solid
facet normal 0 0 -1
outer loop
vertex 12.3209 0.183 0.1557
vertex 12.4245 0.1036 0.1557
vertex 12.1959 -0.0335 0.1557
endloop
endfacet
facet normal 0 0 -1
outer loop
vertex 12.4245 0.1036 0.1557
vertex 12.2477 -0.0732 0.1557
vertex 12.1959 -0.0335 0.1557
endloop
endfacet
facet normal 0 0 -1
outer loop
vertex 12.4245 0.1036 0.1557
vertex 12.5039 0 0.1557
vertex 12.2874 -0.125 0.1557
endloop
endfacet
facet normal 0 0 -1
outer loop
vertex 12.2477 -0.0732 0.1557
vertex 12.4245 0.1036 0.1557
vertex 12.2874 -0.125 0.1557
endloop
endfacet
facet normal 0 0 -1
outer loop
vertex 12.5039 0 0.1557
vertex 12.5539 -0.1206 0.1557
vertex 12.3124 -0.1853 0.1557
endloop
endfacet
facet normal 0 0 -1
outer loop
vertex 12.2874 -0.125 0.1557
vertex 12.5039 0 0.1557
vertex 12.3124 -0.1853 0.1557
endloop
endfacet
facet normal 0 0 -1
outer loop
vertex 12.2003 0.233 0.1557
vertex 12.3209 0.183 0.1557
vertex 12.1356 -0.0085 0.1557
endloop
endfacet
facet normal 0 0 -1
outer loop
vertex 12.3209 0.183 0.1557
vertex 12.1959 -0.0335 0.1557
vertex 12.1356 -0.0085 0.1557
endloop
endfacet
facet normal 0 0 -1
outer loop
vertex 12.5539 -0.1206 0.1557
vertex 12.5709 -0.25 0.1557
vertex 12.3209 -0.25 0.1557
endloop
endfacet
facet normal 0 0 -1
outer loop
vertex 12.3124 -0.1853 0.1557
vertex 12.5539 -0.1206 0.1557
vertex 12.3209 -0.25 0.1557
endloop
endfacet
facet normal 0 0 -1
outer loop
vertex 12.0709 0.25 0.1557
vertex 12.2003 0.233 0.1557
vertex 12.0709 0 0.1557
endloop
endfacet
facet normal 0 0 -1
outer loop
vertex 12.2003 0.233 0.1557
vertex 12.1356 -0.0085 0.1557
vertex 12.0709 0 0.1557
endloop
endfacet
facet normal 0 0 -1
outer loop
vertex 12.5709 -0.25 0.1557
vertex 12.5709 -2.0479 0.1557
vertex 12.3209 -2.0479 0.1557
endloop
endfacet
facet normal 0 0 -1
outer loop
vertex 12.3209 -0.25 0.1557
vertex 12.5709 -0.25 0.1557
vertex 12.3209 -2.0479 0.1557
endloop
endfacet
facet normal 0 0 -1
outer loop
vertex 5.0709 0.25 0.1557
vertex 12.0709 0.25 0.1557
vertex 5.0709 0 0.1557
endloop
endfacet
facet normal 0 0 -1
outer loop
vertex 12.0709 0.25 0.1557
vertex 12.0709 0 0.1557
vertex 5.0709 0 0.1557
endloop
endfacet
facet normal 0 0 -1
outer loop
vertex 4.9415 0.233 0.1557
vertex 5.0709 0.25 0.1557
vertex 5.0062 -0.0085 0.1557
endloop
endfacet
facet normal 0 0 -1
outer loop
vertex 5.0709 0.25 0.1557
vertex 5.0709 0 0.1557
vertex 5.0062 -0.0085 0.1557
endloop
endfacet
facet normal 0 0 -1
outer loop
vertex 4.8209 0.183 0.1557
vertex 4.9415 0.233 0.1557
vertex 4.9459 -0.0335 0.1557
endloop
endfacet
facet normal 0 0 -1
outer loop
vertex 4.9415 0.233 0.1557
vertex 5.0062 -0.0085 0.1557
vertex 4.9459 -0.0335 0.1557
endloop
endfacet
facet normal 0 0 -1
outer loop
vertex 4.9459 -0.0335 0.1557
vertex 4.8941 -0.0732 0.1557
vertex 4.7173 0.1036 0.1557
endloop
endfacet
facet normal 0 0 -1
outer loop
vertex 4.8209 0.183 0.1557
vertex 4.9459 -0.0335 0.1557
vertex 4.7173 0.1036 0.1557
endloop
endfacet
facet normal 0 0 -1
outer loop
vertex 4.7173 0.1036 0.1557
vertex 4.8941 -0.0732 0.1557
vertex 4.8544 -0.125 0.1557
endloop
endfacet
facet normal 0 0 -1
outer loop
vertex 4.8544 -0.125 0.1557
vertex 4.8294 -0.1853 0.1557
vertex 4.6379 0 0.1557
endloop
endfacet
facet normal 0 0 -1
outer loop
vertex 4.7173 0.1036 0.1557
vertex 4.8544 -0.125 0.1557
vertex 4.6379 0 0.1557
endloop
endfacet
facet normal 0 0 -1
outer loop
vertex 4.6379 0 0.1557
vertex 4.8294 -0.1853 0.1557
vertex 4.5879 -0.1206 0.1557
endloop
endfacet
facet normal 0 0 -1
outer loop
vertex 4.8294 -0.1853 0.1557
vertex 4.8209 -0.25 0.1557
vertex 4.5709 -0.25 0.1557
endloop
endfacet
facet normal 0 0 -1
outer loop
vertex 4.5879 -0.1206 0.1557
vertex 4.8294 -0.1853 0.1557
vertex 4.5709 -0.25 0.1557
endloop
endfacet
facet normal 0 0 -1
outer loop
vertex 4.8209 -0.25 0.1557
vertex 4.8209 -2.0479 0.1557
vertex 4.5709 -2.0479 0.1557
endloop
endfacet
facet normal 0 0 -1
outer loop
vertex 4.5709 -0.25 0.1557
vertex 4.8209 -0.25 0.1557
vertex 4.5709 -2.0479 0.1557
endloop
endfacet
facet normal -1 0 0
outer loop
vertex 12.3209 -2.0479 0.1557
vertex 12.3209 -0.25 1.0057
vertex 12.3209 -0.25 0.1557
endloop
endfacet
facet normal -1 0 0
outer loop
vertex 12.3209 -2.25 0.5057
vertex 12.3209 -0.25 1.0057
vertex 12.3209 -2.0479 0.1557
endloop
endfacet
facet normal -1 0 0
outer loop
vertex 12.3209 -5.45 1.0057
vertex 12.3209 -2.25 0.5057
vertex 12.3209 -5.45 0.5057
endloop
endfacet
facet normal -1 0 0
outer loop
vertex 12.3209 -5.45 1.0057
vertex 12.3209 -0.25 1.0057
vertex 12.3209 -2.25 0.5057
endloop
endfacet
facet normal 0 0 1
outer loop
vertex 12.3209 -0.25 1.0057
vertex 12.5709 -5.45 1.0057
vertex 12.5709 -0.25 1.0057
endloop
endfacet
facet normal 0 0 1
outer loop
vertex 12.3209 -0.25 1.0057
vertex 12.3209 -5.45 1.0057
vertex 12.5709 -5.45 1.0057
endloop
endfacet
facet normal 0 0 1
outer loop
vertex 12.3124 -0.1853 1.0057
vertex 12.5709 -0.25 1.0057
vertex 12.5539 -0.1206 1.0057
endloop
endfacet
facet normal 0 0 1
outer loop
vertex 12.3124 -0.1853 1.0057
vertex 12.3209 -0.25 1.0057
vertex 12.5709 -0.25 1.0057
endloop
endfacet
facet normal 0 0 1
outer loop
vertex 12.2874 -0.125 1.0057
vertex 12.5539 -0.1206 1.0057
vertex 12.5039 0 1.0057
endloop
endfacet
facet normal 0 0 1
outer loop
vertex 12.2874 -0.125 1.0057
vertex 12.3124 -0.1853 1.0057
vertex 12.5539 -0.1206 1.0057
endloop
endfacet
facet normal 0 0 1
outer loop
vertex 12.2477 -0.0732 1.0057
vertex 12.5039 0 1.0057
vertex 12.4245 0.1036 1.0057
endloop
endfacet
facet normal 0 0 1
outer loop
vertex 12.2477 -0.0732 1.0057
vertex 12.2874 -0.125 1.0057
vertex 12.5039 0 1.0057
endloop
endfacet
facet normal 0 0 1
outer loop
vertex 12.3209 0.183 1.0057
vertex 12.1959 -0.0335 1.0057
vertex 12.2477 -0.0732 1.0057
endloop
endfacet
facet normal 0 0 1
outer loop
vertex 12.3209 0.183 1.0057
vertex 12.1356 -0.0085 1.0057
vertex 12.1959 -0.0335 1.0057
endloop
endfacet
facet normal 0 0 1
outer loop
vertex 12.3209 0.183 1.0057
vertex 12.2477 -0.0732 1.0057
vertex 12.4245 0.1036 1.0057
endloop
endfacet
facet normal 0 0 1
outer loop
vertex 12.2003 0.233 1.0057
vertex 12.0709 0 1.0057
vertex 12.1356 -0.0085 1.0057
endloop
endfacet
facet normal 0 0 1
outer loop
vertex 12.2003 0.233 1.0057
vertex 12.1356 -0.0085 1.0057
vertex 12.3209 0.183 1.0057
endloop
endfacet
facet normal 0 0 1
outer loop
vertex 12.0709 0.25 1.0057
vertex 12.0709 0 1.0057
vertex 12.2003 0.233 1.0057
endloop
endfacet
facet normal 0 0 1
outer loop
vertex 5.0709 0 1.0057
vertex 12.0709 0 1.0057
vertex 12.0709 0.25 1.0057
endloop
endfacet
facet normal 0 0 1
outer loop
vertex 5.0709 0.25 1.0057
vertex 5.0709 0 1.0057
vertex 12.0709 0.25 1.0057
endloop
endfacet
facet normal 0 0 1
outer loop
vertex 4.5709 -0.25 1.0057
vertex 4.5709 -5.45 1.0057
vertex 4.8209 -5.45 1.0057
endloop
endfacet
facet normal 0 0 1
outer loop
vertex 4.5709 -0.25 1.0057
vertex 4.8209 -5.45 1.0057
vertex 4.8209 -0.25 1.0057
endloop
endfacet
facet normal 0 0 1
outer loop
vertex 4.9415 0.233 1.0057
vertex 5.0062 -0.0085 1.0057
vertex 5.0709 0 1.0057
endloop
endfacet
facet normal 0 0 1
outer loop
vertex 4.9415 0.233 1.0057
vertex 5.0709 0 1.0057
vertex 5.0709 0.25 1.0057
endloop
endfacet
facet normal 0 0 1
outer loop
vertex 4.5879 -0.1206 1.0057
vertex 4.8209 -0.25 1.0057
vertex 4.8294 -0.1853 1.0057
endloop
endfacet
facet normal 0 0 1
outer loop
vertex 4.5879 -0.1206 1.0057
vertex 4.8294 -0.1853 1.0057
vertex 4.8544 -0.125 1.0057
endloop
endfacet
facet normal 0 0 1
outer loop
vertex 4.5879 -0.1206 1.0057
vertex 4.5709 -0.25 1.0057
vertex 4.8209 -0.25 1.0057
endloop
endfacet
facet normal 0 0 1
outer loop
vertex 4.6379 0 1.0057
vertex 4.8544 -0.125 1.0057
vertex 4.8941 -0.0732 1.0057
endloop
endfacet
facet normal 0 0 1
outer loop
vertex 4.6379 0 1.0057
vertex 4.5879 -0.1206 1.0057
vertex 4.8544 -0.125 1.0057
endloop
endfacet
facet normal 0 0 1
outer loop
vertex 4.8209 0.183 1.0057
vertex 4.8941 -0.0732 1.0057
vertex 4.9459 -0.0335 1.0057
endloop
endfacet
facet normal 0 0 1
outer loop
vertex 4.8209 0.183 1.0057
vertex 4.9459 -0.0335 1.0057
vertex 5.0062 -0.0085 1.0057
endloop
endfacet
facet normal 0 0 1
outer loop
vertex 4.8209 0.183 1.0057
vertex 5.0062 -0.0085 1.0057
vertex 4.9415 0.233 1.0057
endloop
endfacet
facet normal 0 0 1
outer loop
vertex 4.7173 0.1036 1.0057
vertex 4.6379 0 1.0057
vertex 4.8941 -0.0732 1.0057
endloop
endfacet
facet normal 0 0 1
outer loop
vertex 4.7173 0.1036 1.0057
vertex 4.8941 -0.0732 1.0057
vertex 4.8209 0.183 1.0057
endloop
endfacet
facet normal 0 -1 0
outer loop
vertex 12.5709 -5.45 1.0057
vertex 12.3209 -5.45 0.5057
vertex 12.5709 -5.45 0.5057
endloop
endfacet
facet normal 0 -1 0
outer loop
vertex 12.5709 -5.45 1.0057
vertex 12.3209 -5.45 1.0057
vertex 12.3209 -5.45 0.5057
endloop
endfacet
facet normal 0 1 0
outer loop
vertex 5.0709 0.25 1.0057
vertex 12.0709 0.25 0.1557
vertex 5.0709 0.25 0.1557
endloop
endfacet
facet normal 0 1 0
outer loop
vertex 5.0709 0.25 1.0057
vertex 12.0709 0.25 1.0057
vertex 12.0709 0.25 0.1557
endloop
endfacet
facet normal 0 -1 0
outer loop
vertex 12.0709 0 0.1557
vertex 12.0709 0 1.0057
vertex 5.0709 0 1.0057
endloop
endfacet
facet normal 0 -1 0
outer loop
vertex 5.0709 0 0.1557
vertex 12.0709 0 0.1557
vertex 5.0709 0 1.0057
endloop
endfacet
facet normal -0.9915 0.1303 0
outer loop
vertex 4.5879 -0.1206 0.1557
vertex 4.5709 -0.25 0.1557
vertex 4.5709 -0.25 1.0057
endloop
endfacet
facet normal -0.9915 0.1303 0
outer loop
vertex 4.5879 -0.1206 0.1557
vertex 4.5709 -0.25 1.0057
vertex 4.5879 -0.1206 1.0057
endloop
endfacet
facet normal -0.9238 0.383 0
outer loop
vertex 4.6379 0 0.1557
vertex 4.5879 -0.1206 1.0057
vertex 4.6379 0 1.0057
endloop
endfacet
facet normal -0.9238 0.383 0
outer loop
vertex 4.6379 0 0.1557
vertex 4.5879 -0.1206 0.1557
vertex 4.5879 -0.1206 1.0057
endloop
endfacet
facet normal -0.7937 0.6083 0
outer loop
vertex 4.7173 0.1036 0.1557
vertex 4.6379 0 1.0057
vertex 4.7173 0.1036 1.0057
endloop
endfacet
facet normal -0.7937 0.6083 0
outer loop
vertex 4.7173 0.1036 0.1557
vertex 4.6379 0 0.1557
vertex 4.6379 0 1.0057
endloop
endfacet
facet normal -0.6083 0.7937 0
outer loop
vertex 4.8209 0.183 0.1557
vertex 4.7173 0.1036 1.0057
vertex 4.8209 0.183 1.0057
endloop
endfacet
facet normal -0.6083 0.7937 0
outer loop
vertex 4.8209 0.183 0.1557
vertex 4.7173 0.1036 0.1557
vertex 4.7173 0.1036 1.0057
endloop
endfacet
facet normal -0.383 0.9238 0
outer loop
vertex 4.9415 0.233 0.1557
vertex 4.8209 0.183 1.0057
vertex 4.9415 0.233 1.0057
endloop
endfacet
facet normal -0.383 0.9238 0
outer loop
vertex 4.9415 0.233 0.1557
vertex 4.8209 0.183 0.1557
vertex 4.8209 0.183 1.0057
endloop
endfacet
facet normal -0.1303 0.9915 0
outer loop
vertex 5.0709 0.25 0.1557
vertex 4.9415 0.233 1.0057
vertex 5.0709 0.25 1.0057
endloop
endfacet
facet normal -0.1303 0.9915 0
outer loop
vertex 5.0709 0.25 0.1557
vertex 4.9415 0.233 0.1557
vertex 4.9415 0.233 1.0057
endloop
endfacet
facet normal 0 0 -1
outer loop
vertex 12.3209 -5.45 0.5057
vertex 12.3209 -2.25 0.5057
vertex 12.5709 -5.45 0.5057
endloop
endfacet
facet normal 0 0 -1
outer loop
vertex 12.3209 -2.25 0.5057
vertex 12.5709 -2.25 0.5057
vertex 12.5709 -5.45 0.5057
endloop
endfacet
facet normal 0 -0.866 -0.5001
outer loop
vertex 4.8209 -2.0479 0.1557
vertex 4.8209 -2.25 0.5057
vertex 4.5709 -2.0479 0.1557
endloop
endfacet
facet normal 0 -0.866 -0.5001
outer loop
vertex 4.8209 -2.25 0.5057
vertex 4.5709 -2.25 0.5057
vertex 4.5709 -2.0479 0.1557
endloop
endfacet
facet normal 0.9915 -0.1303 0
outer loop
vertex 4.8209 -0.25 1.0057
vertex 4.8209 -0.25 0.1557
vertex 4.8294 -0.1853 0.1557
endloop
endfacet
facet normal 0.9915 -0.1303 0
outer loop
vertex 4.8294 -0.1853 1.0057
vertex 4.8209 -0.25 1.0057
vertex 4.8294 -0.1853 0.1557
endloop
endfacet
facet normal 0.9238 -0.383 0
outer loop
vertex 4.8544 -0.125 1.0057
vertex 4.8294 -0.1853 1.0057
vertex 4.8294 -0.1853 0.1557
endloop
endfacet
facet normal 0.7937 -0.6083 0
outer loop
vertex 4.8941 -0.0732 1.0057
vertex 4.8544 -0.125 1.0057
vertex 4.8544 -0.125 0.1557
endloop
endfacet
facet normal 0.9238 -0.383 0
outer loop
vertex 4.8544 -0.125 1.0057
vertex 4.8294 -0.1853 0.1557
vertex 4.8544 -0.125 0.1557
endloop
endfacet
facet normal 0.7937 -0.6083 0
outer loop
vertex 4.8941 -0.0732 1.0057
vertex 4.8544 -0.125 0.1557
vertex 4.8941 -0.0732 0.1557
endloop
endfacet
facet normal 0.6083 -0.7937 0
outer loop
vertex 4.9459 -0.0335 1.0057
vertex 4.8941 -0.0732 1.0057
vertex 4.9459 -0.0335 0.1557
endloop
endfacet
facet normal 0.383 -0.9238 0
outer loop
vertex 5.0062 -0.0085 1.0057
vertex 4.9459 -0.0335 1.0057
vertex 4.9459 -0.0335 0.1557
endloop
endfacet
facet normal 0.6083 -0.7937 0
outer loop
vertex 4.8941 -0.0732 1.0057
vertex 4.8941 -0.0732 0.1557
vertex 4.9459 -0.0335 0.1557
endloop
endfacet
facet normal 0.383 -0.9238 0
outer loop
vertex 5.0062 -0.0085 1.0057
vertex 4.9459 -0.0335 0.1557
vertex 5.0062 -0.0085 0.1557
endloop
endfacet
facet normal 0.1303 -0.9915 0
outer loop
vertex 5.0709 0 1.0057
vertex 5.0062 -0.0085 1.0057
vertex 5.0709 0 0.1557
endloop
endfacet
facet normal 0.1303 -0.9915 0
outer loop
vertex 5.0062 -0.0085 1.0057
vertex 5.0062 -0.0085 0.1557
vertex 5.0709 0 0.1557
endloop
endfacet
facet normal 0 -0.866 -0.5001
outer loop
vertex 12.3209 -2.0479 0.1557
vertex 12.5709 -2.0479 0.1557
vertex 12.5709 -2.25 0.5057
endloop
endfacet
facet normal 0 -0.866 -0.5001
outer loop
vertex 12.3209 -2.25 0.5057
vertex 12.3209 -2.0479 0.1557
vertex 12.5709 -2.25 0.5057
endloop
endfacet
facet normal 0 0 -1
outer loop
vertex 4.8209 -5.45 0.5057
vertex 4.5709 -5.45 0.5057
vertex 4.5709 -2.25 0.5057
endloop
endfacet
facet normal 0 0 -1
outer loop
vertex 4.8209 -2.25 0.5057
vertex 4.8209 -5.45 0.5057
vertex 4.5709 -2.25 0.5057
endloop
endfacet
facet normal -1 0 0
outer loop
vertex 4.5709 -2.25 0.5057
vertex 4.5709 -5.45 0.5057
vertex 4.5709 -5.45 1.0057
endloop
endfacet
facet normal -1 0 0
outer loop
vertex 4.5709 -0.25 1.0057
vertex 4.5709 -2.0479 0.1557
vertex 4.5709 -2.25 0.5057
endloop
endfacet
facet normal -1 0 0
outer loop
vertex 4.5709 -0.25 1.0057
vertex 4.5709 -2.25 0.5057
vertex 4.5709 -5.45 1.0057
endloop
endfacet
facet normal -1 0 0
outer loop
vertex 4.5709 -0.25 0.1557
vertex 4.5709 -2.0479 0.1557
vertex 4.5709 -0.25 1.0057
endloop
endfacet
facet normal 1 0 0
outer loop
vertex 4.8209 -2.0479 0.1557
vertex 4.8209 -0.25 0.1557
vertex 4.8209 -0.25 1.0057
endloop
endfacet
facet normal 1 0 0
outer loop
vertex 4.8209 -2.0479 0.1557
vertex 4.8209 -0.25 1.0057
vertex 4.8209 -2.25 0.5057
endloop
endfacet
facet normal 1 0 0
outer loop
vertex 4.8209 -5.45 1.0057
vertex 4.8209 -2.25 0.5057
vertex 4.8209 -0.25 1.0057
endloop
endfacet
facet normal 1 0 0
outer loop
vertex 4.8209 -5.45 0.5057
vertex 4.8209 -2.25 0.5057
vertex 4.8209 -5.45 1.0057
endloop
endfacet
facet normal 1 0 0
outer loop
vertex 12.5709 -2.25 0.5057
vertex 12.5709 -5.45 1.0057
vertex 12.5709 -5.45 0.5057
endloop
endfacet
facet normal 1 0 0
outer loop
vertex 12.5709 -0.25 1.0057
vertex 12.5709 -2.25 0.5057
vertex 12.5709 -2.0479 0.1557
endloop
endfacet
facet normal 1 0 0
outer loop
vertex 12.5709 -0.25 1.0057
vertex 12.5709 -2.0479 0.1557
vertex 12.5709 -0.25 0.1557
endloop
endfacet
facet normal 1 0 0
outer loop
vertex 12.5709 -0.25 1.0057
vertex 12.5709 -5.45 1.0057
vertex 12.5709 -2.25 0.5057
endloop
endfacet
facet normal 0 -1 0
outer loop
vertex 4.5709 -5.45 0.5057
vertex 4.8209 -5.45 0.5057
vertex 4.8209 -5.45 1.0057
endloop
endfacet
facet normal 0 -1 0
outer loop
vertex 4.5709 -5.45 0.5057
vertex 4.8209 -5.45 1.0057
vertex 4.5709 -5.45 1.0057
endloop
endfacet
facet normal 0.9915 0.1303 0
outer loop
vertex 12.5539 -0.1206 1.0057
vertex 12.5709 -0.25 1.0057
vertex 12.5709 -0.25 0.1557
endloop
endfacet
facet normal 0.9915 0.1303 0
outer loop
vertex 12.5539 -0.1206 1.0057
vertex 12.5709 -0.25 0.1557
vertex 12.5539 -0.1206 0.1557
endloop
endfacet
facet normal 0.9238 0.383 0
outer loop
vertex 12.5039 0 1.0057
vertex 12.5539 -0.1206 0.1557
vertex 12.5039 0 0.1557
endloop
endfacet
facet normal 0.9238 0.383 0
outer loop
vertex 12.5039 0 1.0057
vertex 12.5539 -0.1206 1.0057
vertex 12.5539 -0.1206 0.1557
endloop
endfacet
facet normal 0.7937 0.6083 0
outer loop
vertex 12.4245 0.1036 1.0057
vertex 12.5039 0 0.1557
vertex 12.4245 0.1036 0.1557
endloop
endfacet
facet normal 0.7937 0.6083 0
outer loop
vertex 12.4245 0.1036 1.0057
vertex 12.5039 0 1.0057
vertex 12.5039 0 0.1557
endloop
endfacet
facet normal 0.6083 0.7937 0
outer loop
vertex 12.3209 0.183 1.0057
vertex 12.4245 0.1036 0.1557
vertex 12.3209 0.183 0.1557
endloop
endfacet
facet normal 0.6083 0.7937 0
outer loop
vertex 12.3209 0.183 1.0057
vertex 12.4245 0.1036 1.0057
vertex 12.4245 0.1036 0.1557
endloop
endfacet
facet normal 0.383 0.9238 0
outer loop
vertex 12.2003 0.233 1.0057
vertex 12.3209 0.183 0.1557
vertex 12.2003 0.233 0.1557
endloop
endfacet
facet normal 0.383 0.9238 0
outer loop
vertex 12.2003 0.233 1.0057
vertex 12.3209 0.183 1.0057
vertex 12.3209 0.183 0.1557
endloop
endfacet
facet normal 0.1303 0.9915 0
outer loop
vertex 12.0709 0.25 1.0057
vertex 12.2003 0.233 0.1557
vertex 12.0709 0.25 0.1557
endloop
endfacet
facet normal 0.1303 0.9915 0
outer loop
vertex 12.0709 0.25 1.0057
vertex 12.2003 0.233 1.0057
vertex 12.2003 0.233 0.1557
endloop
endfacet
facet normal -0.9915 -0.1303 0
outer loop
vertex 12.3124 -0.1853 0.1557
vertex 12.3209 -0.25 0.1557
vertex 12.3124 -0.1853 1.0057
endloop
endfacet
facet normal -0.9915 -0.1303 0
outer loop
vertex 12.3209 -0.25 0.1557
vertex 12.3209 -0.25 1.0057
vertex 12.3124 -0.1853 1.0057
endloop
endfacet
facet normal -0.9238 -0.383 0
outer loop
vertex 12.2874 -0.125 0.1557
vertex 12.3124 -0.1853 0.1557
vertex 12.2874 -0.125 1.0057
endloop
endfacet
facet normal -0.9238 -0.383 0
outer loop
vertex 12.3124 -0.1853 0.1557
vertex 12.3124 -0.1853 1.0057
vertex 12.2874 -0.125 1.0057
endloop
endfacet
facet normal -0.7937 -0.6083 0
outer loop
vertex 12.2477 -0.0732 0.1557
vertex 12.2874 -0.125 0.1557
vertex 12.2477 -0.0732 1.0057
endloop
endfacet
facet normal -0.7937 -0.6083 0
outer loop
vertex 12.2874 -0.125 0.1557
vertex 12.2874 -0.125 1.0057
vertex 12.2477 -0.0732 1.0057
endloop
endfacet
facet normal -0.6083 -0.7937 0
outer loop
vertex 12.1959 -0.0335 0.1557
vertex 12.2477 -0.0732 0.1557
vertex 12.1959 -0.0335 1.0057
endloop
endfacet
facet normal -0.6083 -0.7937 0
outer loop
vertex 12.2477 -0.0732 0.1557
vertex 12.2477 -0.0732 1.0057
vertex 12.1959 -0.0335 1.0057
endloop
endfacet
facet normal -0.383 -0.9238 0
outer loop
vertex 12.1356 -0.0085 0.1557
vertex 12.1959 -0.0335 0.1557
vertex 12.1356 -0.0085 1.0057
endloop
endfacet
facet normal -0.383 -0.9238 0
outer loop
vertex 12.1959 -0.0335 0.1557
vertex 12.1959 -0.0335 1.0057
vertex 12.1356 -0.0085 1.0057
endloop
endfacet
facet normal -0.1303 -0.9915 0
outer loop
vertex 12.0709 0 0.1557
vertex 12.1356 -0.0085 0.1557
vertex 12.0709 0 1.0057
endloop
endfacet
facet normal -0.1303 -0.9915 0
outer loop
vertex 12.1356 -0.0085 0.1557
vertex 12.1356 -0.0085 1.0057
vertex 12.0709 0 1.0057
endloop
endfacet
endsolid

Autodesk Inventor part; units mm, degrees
ref_plane "YZ Plane" through (0, 0, 0) normal (1, 0, 0) x (0, 1, 0)
ref_plane "XZ Plane" through (0, 0, 0) normal (0, 1, 0) x (-1, 0, 0)
ref_plane "XY Plane" through (0, 0, 0) normal (0, 0, 1) x (1, 0, 0)
sketch "Sketch1" plane through (0, 0, 0) normal (0, 1, 0) x (-1, 0, 0)
  line L0 (-4.5709, 0.1557) -> (-12.5709, 0.1557)
  line L1 (-12.5709, 0.1557) -> (-12.5709, 1.3557)
  line L2 (-12.5709, 1.3557) -> (-4.5709, 1.3557)
  line L3 (-4.5709, 1.3557) -> (-4.5709, 0.1557)
  dimension "d27" = 8
  dimension "d28" = 1.2
extrude "Plate4" add sketch "Sketch1" along normal blind 0.25
sketch "Sketch5" plane through (12.3209, 0.25, 1.3557) normal (1, 0, 0) x (0, 1, 0)
  line L0 (0, -1.2) -> (0, 0)
  line L1 (0, 0) -> (-5.7, 0)
  line L2 (-5.7, 0) -> (-5.7, -1.2)
  line L3 (-5.7, -1.2) -> (0, -1.2)
edge flange "Flange4" height 5.7 angle 90 thickness 0.25 bend radius 0.25 thickness toward (1, 0, 0) relief tear relief width 0.25 relief depth 0.125 corner gap 0.25 corner form 0 edges at (12.5709, 0, 0.7557) (4.5709, 0, 0.7557) wall of the first edge with corners at (12.3209, 0.25, 0.1557) (12.3209, 0.25, 1.3557) (12.3209, -5.45, 1.3557) (12.3209, -5.45, 0.1557)
bend "Bend4"
corner "Corner4"
sketch "Sketch6" plane through (12.5709, -5.45, 1.3557) normal (1, 0, 0) x (0, 0, -1)
  line L0 (1.2, 0) -> (0, 0) projected
  line L1 (0.6, 0) -> (0.6, 5.2) construction
  line L2 (1.2, 5.2) -> (0, 5.2) projected
  line L3 (1.2, 3.4021) -> (0.85, 3.2)
  line L4 (0.85, 3.2) -> (0.85, 0)
  line L5 (1.2, 0) -> (0.85, 0)
  line L6 (1.2, 5.2) -> (1.2, 0) projected
  line L7 (1.2, 3.4021) -> (1.2, 0)
  line L8 (0, 5.7) -> (1.2, 5.7) projected
  point P0 (1.3557, 5.45)
  dimension "d52" = 3.2
  dimension "d54" = 0.25
  dimension "d56" = 2.5
extrude "Cut1" cut sketch "Sketch6" against normal blind 0.25
ref_plane "Work Plane1" through (12.5709, -0.25, 0.7557) normal (0, 0, -1) x (-1, 0, 0)
ref_plane "Work Plane2" through (8.5709, -5.45, 1.3557) normal (1, 0, 0) x (0, 0, -1)
mirror "Mirror2" about plane through (8.5709, -5.45, 1.3557) normal (1, 0, 0) of "Cut1"
sketch "Sketch7" plane through (8.5709, -5.45, 1.3557) normal (1, 0, 0) x (0, 0, -1)
  line L0 (0, 0) -> (0.85, 0) projected
  line L1 (0, 5.7) -> (1.2, 5.7) projected
  line L2 (0, 0) -> (0.35, 0)
  line L3 (0.35, 0) -> (0.35, 5.7)
  line L4 (0.35, 5.7) -> (0, 5.7)
  line L5 (0, 5.7) -> (0, 0)
  line L6 (1.2, 5.7) -> (1.2, 5.45) projected
  line L7 (1.2, 5.45) -> (0, 5.45) projected
  line L8 (0, 5.45) -> (0, 5.7) projected
  line L9 (0, 5.7) -> (1.2, 5.7) projected
  line L10 (0.6, 6.84) -> (0.6, -1.14) projected
  point P0 (1.3557, 5.45)
  dimension "d57" = 0.25
extrude "Cut2" cut sketch "Sketch7" along normal through all both and the other way through all contours L5 L7 L3 L0 | L5 L1 L3 L7
equation "\"d27\" = atmegaPinBaseWidth"
equation "\"d28\" = atmegaPinWidth1"
equation "\"d52\" = atmegaSeatingPlaneDistance"
equation "\"d54\" = 0.5 * atmegaPinWidth2"
equation "\"d50\" = Thickness"
equation "\"d57\" = 0.5 * atmegaPinWidth2"
equation "\"d58\" = Thickness"
equation "\"d29\" = Thickness"
equation "\"d40\" = BendReliefWidth"
equation "\"d41\" = BendReliefDepth"
equation "\"d42\" = MinimumRemnant"
equation "\"d43\" = TransitionRadius"
equation "\"d44\" = atmegaPinLenght"
equation "\"d46\" = BendRadius"
equation "\"d47\" = CornerReliefSize"
equation "\"d48\" = GapSize"
equation "\"d49\" = JacobiRadiusSize"
equation "\"BendRadius\" = Thickness"
equation "\"BendReliefWidth\" = Thickness"
equation "\"BendReliefDepth\" = 0.5 * Thickness"
equation "\"CornerReliefSize\" = 4 * Thickness"
equation "\"MinimumRemnant\" = 2 * Thickness"
equation "\"TransitionRadius\" = BendRadius"
equation "\"JacobiRadiusSize\" = BendRadius"
equation "\"GapSize\" = Thickness"
equation "\"atmegaPinThickness\" = 0.3"
equation "\"atmegaPinWidth1\" = 1.2"
equation "\"atmegaPinWidth2\" = 0.5"
equation "\"atmegaEndPinWidth\" = 0.9"
equation "\"atmegaPinBendAngle\" = 80deg"
equation "\"atmegaPinBaseWidth\" = 8"
equation "\"atmegaSeatingPlaneDistance\" = 3.2"
equation "\"Thickness\" = 0.25"
equation "\"atmegaPinLenght\" = 5.7"
properties part number "atmega_pin"
